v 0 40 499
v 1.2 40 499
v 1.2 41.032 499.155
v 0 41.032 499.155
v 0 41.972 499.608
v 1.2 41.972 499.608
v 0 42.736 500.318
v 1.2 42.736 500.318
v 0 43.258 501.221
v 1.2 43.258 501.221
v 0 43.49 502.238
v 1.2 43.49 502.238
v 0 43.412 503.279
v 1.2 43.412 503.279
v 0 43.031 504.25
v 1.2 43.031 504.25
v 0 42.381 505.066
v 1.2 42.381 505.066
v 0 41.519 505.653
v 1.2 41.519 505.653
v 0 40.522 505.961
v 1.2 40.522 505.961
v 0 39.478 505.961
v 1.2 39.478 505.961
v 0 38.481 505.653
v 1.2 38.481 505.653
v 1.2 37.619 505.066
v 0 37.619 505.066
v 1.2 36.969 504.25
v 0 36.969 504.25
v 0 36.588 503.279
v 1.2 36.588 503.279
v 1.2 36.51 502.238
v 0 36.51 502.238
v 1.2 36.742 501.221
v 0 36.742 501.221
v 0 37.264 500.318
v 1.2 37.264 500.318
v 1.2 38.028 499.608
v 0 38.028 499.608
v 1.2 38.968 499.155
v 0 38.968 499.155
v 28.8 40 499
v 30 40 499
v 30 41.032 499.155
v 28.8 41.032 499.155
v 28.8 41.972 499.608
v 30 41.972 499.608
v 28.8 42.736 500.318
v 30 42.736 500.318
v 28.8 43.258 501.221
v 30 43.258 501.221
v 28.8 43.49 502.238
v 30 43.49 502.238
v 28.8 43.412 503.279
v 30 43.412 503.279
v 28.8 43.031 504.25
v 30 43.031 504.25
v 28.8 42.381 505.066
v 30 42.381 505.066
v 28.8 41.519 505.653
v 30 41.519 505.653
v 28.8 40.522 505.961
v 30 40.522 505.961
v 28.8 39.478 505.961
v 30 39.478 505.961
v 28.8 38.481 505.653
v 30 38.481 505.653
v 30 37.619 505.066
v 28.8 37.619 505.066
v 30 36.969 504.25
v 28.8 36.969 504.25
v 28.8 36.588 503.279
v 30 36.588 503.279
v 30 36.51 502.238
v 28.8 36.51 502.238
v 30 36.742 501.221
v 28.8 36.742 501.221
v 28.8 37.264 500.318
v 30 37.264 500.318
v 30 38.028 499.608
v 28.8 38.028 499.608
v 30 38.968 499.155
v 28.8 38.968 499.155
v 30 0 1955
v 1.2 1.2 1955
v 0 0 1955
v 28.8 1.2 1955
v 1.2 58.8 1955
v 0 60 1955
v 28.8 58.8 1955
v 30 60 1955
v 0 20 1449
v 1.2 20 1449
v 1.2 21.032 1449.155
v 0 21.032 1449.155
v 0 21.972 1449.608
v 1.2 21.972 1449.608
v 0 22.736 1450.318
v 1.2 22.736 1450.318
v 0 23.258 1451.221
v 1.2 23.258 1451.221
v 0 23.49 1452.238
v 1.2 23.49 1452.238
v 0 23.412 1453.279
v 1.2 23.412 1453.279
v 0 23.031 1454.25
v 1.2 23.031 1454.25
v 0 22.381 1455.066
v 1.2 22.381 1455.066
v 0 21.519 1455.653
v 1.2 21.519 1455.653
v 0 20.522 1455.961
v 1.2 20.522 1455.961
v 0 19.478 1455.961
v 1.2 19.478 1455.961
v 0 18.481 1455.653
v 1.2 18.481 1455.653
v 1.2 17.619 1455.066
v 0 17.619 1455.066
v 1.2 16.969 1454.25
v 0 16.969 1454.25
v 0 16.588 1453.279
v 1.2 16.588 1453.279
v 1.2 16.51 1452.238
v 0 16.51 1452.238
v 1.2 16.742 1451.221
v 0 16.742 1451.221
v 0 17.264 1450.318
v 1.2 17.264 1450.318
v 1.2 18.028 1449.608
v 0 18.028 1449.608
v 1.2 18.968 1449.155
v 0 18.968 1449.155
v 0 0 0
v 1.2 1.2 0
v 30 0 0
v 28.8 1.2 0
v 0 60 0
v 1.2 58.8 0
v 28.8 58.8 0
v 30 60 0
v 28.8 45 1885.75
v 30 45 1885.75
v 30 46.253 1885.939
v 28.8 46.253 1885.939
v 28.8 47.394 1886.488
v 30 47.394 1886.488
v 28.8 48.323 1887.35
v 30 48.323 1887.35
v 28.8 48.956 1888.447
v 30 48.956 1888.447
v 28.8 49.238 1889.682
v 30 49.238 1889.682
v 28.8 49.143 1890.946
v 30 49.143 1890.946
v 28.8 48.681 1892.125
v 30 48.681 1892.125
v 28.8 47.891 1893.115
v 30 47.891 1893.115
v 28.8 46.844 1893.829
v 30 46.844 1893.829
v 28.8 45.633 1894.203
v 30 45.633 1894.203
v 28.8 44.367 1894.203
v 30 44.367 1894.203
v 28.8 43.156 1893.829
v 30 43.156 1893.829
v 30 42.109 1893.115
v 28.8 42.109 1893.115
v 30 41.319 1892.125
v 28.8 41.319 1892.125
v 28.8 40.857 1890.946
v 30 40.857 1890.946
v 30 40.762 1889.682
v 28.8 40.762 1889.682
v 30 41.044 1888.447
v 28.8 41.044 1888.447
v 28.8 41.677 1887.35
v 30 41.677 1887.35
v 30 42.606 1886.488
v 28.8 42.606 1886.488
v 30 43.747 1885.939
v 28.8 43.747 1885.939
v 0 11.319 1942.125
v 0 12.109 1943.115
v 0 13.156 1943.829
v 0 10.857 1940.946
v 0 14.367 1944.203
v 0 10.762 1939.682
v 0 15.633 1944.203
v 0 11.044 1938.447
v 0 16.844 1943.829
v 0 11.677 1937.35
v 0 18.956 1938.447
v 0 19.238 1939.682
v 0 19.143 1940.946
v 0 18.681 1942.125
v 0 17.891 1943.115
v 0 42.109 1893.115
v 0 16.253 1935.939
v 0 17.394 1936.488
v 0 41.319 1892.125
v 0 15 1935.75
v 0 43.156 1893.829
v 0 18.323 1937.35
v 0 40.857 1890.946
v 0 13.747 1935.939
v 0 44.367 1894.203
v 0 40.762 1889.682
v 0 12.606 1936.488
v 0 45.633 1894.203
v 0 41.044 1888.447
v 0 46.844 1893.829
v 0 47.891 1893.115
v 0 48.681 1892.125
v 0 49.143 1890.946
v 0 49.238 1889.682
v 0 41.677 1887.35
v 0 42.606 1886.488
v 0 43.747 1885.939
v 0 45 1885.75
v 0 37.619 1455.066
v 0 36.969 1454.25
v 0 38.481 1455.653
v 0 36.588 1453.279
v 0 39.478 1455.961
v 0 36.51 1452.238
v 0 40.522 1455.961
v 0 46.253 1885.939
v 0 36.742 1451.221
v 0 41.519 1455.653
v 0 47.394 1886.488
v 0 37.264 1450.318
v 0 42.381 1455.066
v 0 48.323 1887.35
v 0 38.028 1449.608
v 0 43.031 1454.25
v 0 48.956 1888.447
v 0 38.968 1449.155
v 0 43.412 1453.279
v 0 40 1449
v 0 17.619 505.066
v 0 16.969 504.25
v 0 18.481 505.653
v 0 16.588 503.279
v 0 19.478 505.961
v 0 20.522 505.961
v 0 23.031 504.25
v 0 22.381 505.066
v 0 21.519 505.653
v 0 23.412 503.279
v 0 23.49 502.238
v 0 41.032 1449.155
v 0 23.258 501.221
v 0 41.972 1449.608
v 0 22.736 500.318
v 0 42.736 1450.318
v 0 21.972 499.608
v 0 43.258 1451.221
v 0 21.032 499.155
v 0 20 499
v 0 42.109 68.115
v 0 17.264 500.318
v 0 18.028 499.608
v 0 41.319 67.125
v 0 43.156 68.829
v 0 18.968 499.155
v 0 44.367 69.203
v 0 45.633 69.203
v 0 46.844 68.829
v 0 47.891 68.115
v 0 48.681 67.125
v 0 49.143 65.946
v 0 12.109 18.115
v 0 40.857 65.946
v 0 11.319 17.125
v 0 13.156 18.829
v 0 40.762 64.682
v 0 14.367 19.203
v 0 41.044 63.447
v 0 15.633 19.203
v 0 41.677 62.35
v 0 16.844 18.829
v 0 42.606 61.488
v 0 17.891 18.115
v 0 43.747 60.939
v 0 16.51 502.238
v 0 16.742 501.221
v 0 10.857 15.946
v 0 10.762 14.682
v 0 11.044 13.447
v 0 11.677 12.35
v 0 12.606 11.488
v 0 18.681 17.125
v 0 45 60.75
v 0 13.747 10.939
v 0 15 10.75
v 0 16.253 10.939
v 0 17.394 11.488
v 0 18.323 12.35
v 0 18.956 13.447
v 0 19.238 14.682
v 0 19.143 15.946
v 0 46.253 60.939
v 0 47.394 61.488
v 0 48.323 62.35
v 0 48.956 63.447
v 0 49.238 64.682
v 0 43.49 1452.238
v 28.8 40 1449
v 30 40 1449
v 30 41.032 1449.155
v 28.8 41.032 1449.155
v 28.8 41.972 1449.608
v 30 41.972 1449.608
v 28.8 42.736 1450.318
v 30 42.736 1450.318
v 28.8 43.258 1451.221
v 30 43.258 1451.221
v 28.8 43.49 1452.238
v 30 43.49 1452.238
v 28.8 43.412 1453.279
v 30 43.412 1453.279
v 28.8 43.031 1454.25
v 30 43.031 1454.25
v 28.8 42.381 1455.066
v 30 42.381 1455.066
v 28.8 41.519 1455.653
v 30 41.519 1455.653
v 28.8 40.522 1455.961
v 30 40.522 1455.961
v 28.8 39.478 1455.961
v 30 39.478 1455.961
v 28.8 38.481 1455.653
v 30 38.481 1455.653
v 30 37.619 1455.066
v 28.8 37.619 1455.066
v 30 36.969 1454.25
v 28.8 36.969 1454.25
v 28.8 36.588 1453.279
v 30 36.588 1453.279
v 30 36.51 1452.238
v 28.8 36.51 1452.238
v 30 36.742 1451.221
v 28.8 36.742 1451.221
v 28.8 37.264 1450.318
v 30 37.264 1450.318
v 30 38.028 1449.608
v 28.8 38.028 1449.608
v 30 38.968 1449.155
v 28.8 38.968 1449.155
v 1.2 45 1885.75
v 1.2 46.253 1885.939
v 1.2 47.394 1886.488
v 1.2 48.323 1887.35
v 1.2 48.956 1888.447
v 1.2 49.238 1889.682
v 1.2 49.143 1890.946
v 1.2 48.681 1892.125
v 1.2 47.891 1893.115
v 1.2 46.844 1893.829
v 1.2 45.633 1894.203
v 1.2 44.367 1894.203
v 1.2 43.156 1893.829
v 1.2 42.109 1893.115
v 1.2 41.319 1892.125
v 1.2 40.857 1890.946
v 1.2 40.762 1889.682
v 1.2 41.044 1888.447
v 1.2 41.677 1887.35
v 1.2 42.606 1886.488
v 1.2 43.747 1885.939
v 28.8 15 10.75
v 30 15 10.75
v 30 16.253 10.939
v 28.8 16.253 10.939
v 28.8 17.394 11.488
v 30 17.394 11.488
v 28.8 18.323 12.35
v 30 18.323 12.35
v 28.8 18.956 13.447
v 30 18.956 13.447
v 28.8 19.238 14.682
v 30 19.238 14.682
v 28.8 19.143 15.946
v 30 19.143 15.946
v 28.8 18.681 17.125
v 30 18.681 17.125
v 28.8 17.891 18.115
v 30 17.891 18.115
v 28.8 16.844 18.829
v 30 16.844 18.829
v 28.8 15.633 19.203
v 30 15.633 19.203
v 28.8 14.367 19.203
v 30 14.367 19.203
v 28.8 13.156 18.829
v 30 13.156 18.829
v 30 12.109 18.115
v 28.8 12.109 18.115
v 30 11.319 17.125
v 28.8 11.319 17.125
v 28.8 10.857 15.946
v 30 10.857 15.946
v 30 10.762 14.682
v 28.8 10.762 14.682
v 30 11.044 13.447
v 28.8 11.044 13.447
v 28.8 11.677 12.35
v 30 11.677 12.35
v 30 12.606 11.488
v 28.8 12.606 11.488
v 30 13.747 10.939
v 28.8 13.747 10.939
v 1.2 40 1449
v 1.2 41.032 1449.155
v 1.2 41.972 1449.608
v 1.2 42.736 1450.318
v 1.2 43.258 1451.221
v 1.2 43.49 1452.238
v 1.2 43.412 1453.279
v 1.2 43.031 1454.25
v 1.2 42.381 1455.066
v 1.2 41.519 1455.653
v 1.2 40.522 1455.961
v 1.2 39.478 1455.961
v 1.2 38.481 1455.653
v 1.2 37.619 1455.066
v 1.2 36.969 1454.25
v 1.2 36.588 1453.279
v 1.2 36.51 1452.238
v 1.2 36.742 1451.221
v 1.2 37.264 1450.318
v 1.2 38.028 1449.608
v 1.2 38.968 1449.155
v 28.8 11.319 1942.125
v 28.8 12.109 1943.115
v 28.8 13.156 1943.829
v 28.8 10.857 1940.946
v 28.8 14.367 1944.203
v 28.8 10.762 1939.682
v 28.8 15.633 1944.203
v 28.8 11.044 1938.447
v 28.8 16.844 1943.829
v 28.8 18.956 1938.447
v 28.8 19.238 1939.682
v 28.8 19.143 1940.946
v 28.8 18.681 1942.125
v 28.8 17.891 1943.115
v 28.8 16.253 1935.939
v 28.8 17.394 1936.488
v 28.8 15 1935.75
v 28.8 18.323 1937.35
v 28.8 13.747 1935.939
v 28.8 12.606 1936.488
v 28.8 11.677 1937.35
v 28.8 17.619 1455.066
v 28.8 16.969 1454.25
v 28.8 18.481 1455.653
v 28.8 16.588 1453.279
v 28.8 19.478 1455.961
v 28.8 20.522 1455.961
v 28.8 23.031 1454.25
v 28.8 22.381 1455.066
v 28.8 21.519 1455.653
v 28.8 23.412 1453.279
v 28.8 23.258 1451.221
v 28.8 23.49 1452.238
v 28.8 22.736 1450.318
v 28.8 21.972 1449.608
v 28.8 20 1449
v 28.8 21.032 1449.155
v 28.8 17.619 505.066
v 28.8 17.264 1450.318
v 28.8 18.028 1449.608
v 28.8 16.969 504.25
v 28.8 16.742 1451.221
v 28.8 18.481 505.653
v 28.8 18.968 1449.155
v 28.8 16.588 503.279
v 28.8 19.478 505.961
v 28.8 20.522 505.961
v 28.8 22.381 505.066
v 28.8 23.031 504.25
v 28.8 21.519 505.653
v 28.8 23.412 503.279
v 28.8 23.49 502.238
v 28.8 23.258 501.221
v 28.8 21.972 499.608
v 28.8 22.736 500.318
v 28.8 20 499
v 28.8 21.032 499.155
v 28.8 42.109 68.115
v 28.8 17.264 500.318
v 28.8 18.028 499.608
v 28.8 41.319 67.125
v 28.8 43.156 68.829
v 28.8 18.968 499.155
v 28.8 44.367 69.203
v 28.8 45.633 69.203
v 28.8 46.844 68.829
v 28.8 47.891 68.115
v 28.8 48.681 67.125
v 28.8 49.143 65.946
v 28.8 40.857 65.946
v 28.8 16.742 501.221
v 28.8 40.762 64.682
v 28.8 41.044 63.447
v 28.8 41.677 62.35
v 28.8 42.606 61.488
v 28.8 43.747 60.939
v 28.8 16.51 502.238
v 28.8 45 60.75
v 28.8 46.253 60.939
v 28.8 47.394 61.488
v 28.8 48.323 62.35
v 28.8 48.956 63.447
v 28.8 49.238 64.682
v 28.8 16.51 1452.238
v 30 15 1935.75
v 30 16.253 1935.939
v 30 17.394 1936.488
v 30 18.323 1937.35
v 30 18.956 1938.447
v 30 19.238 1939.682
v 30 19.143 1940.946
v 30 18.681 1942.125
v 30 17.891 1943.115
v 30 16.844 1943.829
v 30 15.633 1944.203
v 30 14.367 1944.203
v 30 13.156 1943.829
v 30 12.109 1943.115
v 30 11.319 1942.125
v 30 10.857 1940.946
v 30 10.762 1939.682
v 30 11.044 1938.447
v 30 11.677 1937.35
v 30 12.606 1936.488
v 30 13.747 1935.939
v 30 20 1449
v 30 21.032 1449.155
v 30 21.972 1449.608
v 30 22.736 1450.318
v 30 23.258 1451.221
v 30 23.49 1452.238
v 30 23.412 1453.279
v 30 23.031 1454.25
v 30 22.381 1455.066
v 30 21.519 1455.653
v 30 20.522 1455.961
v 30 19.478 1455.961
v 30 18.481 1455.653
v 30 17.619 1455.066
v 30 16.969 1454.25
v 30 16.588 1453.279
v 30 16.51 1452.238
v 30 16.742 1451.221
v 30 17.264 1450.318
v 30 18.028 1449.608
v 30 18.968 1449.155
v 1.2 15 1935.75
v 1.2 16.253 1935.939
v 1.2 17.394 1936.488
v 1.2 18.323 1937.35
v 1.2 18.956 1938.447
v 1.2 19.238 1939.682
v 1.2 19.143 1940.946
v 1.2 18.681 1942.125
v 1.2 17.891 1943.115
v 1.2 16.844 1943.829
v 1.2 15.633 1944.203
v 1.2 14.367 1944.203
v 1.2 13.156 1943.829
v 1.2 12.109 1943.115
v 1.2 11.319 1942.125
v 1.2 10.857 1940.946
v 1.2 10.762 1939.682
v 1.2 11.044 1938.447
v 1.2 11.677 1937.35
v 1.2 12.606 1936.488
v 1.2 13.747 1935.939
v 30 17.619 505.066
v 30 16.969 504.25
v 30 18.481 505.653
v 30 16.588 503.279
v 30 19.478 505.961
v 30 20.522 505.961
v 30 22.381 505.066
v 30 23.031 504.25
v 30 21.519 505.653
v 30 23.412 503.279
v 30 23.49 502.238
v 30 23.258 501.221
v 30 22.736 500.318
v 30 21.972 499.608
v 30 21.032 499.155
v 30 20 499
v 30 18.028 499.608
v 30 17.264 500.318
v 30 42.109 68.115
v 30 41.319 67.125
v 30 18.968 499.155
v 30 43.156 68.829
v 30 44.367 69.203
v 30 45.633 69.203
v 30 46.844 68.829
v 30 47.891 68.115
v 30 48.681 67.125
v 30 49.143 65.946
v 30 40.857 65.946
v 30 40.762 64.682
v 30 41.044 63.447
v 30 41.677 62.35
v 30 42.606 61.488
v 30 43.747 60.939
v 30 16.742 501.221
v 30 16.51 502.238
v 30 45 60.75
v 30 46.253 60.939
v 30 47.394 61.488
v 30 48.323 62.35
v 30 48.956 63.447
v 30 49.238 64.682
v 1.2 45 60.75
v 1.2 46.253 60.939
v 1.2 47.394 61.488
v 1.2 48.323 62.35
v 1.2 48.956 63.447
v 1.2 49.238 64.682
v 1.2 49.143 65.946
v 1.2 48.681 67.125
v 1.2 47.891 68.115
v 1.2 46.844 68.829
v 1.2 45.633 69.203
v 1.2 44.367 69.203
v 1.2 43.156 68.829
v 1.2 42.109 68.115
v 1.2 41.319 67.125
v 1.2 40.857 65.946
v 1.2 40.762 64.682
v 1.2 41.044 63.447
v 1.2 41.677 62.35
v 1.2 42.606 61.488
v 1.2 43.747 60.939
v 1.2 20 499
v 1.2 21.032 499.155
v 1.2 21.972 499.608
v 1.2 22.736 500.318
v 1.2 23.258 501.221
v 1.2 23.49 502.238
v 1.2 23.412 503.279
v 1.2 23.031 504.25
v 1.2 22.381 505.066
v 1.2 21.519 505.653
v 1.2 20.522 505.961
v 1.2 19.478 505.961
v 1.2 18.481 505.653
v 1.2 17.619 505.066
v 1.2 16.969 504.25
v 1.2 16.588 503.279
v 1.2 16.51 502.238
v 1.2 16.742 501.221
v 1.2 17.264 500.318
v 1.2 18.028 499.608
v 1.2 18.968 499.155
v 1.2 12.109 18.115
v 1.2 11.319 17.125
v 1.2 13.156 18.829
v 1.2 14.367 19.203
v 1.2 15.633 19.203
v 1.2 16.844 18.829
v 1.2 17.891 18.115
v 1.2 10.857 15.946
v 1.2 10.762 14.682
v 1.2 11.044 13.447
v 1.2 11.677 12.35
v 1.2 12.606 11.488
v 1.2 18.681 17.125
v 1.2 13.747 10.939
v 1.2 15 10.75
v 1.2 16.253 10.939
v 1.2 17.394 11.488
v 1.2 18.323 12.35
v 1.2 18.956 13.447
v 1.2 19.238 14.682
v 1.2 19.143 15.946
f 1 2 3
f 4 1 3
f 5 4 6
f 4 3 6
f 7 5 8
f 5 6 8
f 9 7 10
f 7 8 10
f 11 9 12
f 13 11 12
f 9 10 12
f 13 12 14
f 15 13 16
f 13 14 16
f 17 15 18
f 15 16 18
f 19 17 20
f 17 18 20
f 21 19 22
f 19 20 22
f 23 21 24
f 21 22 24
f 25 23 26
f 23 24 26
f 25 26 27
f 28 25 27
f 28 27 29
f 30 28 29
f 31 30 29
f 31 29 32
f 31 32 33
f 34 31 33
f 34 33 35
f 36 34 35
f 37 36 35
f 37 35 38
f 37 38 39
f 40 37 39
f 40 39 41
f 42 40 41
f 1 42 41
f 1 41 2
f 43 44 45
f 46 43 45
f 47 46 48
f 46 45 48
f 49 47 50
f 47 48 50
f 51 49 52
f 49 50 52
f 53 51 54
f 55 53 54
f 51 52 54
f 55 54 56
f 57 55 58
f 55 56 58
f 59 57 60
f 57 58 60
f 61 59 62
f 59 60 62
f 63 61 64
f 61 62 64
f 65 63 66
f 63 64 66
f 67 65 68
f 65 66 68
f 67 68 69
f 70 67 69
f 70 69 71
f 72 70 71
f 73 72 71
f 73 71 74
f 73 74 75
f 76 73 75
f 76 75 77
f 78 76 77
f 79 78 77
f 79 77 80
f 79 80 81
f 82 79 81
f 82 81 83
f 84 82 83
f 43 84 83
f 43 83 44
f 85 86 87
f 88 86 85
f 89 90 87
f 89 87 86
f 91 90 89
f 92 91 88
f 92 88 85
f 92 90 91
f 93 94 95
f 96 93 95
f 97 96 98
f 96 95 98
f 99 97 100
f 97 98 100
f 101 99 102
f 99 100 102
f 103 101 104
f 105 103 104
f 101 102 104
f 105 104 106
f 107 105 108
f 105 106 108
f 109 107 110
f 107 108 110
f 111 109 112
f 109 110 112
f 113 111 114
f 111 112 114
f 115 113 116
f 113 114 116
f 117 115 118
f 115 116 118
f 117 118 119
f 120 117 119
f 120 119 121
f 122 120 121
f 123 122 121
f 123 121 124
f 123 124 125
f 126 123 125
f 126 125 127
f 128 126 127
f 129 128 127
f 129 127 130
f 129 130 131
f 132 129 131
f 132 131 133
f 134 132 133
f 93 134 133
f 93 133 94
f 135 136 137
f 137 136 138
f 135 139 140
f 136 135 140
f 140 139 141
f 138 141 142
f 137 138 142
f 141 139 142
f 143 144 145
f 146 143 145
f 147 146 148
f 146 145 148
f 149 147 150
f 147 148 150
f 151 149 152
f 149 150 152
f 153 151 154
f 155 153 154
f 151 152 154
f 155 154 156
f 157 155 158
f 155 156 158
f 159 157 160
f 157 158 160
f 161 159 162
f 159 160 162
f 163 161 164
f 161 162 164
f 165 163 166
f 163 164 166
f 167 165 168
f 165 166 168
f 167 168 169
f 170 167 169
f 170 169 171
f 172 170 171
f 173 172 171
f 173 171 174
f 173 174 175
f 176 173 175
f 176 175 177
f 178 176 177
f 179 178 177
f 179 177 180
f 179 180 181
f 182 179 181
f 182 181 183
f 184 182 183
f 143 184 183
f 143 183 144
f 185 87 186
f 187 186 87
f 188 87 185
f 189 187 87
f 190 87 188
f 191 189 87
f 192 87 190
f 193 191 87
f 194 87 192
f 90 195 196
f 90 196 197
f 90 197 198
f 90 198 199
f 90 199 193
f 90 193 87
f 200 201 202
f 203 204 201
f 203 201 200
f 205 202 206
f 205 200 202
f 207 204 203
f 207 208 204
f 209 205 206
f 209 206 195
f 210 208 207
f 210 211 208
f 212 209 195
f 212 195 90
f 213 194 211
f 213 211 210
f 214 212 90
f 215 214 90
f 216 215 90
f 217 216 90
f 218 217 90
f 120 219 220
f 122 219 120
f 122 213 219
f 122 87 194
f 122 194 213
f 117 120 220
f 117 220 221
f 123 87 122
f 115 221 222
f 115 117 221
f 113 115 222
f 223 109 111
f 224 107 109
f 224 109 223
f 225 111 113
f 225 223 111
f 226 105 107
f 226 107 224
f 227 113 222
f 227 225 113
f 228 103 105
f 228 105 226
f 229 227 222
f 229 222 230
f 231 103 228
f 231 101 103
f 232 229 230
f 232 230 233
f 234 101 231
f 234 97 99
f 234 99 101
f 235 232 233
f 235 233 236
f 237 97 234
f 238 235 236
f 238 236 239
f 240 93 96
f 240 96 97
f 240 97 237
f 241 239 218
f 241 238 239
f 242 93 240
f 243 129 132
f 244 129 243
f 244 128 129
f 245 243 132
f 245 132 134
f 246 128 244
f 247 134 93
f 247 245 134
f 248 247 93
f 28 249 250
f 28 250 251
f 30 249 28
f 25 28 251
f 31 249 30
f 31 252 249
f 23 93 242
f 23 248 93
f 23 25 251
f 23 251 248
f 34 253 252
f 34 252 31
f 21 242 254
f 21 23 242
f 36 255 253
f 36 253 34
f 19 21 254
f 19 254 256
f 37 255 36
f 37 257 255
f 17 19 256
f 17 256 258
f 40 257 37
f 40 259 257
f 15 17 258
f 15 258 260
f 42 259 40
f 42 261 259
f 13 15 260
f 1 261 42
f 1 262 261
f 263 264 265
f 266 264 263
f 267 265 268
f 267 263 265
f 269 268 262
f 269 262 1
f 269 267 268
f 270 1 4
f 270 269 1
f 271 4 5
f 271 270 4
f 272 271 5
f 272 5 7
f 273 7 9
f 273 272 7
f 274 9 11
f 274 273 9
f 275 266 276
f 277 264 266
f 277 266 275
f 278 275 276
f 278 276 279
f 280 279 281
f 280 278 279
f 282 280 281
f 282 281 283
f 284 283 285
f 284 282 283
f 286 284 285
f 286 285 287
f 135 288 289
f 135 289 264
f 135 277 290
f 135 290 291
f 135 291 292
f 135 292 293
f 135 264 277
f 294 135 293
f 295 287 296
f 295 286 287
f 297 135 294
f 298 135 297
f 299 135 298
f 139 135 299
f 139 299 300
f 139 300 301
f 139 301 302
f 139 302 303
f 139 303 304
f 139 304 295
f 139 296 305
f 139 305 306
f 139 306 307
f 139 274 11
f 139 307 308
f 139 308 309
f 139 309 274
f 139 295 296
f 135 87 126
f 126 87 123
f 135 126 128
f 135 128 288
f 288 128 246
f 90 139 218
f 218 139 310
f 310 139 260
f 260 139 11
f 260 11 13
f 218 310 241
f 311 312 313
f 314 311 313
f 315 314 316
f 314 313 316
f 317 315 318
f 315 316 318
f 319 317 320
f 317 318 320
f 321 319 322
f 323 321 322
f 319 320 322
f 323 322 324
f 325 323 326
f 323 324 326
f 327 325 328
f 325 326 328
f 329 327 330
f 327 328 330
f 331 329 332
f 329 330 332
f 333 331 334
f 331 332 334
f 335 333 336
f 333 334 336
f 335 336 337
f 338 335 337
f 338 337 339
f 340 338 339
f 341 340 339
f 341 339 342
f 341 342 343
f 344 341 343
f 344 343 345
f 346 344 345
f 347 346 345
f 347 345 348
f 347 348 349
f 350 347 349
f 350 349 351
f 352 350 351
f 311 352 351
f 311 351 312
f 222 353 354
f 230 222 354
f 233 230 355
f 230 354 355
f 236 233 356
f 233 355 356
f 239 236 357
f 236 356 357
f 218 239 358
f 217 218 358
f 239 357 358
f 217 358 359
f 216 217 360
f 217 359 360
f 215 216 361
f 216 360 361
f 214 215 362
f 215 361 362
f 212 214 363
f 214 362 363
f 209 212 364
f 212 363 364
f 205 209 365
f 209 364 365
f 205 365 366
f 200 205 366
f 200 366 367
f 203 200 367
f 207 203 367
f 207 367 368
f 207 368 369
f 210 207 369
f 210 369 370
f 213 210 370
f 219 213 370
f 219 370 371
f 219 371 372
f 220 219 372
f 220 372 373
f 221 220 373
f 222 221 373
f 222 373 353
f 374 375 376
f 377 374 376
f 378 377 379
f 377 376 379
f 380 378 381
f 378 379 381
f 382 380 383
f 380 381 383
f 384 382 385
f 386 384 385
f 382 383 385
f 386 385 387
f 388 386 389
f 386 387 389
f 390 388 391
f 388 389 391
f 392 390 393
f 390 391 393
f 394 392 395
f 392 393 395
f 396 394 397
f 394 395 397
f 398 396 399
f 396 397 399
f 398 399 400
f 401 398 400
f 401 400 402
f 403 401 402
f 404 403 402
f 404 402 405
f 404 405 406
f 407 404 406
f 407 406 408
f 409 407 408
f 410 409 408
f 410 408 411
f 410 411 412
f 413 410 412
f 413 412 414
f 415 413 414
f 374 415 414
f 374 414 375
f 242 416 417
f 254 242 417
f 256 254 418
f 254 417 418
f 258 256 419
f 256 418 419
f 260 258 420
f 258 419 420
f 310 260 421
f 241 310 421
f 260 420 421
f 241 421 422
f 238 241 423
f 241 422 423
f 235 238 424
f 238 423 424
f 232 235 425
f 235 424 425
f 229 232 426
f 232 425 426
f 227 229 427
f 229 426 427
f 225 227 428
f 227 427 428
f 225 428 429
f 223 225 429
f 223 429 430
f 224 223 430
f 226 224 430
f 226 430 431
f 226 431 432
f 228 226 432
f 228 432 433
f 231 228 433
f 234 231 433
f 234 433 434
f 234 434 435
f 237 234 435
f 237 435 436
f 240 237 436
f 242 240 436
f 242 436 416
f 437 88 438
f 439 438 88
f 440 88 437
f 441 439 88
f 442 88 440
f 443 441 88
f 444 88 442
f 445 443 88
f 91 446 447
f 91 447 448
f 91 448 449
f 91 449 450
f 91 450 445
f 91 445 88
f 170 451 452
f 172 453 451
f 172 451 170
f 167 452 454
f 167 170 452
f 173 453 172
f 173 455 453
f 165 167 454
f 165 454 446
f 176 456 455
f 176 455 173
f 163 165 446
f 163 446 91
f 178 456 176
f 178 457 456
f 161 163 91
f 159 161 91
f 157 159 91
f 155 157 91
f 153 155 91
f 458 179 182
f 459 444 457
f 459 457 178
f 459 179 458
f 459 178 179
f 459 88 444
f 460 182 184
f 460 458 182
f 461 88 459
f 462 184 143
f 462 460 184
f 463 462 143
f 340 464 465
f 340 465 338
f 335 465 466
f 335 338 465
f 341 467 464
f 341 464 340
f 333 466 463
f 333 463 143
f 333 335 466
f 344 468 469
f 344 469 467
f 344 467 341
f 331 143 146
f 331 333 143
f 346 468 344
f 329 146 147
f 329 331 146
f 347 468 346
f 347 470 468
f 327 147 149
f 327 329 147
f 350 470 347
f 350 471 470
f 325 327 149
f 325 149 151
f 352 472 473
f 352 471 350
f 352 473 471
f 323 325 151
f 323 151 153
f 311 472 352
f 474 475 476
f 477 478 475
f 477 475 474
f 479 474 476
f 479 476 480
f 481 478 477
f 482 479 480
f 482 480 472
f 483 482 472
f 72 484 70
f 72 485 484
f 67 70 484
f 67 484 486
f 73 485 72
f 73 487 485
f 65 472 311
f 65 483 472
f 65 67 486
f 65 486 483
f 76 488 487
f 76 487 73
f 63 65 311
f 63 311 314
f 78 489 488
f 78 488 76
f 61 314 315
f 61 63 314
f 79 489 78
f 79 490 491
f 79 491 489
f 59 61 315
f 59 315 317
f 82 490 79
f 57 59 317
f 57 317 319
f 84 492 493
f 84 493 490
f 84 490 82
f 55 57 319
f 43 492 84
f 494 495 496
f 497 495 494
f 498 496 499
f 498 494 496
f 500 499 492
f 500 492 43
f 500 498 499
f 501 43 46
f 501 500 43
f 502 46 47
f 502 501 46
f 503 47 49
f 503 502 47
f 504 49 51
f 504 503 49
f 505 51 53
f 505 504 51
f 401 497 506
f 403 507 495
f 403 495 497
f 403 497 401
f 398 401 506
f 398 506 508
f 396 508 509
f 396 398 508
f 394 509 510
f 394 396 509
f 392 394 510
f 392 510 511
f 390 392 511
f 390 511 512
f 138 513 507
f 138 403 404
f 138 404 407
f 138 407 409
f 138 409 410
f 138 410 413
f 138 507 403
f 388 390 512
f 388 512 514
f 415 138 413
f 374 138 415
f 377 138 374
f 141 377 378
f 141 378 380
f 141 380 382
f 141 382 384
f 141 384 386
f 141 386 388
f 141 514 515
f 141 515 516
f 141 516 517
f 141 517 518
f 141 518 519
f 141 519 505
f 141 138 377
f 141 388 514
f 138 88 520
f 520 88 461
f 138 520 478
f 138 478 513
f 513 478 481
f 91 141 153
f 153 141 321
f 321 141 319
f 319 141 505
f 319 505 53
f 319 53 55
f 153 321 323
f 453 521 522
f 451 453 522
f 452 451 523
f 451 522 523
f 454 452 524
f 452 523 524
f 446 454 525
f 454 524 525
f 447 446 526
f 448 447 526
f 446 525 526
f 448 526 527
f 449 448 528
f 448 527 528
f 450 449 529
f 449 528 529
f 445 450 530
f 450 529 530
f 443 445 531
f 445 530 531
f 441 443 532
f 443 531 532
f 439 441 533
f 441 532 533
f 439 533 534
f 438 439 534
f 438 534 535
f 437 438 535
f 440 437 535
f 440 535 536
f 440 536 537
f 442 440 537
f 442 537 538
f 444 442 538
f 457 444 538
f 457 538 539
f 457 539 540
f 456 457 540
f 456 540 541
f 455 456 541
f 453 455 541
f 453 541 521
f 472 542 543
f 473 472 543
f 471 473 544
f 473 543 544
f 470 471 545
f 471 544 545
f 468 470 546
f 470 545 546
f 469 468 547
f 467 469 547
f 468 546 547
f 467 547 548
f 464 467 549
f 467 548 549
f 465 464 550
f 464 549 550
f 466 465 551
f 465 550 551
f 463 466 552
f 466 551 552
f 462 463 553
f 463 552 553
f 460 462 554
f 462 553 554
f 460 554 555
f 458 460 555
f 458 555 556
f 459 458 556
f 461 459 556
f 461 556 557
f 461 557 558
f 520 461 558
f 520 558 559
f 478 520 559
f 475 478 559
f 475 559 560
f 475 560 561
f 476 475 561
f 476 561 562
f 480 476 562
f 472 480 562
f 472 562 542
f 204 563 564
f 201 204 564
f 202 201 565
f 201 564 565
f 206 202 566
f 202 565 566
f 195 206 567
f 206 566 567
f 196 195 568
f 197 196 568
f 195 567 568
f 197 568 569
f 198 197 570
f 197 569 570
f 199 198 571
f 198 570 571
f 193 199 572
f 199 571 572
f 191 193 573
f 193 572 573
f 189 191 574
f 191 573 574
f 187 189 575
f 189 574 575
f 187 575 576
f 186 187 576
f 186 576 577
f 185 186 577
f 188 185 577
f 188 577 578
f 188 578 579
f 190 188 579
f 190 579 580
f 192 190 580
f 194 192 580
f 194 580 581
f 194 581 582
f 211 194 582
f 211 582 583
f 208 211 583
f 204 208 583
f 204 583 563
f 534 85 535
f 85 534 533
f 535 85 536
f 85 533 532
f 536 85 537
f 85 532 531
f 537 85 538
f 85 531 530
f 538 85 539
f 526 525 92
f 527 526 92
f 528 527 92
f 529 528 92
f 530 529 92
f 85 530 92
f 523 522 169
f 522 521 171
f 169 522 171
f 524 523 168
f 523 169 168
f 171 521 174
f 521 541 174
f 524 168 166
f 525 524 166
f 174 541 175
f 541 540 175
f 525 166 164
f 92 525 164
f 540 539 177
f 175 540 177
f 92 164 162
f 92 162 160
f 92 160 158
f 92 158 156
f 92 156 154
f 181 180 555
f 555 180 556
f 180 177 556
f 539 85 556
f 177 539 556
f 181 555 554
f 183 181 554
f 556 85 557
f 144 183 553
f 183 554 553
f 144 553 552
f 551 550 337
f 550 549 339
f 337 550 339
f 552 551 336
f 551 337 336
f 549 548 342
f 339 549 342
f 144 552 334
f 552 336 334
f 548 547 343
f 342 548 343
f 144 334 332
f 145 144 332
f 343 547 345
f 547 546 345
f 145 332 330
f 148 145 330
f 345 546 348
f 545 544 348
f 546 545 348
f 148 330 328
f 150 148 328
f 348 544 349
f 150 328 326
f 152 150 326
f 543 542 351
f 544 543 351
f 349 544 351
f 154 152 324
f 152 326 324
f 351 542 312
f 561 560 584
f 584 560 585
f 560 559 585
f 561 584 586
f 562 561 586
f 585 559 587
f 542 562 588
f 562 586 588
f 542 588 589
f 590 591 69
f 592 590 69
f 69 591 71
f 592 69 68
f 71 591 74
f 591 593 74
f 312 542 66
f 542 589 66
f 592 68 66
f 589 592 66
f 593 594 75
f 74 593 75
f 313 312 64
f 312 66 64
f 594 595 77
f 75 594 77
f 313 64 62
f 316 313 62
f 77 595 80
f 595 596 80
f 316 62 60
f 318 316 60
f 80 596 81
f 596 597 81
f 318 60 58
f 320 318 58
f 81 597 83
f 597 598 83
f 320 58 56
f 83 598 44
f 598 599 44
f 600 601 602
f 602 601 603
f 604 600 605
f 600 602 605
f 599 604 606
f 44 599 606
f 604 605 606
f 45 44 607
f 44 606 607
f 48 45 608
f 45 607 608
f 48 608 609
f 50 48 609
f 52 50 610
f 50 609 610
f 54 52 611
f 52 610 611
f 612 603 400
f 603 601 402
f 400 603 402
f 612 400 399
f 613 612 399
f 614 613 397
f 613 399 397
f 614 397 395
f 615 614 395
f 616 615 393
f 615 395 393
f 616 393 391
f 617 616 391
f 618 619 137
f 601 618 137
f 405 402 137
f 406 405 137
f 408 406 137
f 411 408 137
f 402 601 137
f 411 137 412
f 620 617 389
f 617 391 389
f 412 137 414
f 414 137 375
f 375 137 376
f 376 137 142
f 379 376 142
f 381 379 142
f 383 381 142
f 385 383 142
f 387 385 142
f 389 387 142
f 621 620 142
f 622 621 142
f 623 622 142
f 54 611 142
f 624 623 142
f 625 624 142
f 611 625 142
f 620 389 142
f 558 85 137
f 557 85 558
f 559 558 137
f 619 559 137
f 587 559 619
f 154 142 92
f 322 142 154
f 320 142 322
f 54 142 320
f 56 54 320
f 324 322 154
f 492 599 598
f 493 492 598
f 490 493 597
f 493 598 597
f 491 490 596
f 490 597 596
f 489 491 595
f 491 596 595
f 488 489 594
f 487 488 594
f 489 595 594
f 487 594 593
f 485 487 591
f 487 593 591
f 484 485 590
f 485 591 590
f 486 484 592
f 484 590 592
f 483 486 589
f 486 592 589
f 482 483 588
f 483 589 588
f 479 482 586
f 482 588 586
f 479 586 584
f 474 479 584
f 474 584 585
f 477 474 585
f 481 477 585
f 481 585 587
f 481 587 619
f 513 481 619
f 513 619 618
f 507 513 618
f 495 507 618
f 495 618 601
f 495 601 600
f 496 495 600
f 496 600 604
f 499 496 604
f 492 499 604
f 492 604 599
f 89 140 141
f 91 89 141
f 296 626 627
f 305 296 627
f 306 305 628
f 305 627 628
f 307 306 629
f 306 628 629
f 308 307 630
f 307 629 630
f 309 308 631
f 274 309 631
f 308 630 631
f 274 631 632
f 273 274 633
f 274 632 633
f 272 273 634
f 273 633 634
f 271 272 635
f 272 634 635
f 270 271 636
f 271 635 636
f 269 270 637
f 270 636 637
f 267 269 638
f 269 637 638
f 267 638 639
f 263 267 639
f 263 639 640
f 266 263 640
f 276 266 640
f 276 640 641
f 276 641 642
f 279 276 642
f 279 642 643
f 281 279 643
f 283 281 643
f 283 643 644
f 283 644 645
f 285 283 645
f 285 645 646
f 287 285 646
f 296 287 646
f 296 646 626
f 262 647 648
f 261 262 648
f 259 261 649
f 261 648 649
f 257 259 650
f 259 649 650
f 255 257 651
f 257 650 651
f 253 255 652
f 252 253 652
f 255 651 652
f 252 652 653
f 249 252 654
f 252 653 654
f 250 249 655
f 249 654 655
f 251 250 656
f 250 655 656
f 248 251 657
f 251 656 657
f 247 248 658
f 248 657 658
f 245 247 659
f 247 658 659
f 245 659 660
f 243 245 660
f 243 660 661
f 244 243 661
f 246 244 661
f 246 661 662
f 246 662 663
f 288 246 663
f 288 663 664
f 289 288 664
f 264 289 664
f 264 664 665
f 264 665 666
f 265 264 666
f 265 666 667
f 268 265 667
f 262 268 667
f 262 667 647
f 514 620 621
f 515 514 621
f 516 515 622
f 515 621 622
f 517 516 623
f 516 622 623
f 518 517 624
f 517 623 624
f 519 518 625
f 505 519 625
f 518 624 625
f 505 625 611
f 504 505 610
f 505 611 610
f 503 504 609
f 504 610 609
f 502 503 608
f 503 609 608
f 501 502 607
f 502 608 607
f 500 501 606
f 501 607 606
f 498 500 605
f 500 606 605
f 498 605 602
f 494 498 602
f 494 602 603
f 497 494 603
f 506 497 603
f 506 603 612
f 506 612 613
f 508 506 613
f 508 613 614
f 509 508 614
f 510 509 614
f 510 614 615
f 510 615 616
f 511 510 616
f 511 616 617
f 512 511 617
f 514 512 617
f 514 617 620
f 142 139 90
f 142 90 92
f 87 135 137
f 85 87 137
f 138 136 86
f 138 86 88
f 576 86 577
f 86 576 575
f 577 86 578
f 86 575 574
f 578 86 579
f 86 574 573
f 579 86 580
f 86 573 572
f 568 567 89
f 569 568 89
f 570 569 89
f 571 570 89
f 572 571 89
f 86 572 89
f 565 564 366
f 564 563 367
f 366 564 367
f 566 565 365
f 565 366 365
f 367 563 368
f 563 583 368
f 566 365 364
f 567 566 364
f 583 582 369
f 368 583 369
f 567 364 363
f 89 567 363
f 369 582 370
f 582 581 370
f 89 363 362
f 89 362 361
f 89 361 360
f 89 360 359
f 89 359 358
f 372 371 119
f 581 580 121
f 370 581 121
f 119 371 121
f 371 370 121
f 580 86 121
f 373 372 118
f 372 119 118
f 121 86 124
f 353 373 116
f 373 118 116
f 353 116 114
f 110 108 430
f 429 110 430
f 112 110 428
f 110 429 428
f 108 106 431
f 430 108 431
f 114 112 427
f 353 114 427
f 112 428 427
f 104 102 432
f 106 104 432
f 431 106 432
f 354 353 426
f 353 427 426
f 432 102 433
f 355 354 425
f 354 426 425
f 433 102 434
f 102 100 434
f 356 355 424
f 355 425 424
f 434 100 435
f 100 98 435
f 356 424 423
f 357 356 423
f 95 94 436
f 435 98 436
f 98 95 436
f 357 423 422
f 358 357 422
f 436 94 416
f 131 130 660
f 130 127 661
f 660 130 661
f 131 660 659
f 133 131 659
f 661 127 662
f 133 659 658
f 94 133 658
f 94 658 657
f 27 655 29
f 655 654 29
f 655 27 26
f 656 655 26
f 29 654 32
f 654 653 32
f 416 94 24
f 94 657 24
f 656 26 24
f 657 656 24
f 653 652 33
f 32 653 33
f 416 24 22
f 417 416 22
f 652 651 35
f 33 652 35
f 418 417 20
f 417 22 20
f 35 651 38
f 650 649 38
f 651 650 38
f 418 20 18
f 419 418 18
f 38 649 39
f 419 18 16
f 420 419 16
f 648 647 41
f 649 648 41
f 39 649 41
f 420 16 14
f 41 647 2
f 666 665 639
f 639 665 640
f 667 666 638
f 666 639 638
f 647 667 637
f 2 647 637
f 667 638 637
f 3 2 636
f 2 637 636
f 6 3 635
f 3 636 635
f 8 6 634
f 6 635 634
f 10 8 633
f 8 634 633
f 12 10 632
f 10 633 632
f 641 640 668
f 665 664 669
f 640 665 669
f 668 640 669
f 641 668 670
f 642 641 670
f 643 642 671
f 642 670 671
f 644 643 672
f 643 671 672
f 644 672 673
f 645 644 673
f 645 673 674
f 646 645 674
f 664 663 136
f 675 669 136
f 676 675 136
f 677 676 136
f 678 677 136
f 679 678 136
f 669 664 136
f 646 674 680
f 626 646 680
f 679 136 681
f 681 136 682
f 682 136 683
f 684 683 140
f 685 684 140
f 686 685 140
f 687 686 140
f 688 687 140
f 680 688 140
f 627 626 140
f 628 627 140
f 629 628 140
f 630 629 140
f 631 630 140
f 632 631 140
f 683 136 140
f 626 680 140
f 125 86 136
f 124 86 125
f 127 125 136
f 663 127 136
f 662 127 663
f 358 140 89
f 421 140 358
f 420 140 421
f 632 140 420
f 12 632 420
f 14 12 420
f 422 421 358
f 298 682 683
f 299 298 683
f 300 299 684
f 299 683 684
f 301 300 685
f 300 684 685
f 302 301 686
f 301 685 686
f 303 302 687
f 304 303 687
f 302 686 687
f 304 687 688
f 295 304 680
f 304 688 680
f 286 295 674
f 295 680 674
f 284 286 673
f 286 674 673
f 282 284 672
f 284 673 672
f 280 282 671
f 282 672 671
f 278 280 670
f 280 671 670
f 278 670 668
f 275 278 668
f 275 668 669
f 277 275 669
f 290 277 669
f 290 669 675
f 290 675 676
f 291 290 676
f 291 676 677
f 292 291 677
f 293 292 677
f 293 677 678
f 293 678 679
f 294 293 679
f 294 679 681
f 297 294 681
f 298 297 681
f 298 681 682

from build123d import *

# Parameters (mm, degrees)
SKETCH1_W           = 30
SKETCH1_H           = 60
SKETCH1_W_2         = 27.6
SKETCH1_H_2         = 57.6
BOSS_EXTRUDE1_DEPTH = 1955
SKETCH4_R           = 3.5
CUT_EXTRUDE3_DEPTH  = 1957.150556578
SKETCH5_R           = 4.25
CUT_EXTRUDE4_DEPTH  = 1957.150556578


with BuildPart() as part:
    # Sketch1 → Boss-Extrude1 (new body)
    with BuildSketch(Plane.XY):
        with Locations((15, 30)):
            Rectangle(SKETCH1_W, SKETCH1_H)
        with Locations((15, 30)):
            Rectangle(SKETCH1_W_2, SKETCH1_H_2, mode=Mode.SUBTRACT)
    extrude(amount=BOSS_EXTRUDE1_DEPTH)

    # Sketch4 → Cut-Extrude3 (cut, through all)
    with BuildSketch(Plane(origin=(30, 0, 0), x_dir=(0, 0, -1), z_dir=(1, 0, 0))):
        with Locations((-1452.5, 40)):
            Circle(SKETCH4_R)
        with Locations((-1452.5, 20)):
            Circle(SKETCH4_R)
        with Locations((-502.5, 40)):
            Circle(SKETCH4_R)
        with Locations((-502.5, 20)):
            Circle(SKETCH4_R)
    extrude(amount=-CUT_EXTRUDE3_DEPTH, mode=Mode.SUBTRACT)

    # Sketch5 → Cut-Extrude4 (cut, through all)
    with BuildSketch(Plane(origin=(30, 0, 0), x_dir=(0, 0, -1), z_dir=(1, 0, 0))):
        with Locations((-15, 15)):
            Circle(SKETCH5_R)
        with Locations((-65, 45)):
            Circle(SKETCH5_R)
        with Locations((-1890, 45)):
            Circle(SKETCH5_R)
        with Locations((-1940, 15)):
            Circle(SKETCH5_R)
    extrude(amount=-CUT_EXTRUDE4_DEPTH, mode=Mode.SUBTRACT)


solid = part.part
